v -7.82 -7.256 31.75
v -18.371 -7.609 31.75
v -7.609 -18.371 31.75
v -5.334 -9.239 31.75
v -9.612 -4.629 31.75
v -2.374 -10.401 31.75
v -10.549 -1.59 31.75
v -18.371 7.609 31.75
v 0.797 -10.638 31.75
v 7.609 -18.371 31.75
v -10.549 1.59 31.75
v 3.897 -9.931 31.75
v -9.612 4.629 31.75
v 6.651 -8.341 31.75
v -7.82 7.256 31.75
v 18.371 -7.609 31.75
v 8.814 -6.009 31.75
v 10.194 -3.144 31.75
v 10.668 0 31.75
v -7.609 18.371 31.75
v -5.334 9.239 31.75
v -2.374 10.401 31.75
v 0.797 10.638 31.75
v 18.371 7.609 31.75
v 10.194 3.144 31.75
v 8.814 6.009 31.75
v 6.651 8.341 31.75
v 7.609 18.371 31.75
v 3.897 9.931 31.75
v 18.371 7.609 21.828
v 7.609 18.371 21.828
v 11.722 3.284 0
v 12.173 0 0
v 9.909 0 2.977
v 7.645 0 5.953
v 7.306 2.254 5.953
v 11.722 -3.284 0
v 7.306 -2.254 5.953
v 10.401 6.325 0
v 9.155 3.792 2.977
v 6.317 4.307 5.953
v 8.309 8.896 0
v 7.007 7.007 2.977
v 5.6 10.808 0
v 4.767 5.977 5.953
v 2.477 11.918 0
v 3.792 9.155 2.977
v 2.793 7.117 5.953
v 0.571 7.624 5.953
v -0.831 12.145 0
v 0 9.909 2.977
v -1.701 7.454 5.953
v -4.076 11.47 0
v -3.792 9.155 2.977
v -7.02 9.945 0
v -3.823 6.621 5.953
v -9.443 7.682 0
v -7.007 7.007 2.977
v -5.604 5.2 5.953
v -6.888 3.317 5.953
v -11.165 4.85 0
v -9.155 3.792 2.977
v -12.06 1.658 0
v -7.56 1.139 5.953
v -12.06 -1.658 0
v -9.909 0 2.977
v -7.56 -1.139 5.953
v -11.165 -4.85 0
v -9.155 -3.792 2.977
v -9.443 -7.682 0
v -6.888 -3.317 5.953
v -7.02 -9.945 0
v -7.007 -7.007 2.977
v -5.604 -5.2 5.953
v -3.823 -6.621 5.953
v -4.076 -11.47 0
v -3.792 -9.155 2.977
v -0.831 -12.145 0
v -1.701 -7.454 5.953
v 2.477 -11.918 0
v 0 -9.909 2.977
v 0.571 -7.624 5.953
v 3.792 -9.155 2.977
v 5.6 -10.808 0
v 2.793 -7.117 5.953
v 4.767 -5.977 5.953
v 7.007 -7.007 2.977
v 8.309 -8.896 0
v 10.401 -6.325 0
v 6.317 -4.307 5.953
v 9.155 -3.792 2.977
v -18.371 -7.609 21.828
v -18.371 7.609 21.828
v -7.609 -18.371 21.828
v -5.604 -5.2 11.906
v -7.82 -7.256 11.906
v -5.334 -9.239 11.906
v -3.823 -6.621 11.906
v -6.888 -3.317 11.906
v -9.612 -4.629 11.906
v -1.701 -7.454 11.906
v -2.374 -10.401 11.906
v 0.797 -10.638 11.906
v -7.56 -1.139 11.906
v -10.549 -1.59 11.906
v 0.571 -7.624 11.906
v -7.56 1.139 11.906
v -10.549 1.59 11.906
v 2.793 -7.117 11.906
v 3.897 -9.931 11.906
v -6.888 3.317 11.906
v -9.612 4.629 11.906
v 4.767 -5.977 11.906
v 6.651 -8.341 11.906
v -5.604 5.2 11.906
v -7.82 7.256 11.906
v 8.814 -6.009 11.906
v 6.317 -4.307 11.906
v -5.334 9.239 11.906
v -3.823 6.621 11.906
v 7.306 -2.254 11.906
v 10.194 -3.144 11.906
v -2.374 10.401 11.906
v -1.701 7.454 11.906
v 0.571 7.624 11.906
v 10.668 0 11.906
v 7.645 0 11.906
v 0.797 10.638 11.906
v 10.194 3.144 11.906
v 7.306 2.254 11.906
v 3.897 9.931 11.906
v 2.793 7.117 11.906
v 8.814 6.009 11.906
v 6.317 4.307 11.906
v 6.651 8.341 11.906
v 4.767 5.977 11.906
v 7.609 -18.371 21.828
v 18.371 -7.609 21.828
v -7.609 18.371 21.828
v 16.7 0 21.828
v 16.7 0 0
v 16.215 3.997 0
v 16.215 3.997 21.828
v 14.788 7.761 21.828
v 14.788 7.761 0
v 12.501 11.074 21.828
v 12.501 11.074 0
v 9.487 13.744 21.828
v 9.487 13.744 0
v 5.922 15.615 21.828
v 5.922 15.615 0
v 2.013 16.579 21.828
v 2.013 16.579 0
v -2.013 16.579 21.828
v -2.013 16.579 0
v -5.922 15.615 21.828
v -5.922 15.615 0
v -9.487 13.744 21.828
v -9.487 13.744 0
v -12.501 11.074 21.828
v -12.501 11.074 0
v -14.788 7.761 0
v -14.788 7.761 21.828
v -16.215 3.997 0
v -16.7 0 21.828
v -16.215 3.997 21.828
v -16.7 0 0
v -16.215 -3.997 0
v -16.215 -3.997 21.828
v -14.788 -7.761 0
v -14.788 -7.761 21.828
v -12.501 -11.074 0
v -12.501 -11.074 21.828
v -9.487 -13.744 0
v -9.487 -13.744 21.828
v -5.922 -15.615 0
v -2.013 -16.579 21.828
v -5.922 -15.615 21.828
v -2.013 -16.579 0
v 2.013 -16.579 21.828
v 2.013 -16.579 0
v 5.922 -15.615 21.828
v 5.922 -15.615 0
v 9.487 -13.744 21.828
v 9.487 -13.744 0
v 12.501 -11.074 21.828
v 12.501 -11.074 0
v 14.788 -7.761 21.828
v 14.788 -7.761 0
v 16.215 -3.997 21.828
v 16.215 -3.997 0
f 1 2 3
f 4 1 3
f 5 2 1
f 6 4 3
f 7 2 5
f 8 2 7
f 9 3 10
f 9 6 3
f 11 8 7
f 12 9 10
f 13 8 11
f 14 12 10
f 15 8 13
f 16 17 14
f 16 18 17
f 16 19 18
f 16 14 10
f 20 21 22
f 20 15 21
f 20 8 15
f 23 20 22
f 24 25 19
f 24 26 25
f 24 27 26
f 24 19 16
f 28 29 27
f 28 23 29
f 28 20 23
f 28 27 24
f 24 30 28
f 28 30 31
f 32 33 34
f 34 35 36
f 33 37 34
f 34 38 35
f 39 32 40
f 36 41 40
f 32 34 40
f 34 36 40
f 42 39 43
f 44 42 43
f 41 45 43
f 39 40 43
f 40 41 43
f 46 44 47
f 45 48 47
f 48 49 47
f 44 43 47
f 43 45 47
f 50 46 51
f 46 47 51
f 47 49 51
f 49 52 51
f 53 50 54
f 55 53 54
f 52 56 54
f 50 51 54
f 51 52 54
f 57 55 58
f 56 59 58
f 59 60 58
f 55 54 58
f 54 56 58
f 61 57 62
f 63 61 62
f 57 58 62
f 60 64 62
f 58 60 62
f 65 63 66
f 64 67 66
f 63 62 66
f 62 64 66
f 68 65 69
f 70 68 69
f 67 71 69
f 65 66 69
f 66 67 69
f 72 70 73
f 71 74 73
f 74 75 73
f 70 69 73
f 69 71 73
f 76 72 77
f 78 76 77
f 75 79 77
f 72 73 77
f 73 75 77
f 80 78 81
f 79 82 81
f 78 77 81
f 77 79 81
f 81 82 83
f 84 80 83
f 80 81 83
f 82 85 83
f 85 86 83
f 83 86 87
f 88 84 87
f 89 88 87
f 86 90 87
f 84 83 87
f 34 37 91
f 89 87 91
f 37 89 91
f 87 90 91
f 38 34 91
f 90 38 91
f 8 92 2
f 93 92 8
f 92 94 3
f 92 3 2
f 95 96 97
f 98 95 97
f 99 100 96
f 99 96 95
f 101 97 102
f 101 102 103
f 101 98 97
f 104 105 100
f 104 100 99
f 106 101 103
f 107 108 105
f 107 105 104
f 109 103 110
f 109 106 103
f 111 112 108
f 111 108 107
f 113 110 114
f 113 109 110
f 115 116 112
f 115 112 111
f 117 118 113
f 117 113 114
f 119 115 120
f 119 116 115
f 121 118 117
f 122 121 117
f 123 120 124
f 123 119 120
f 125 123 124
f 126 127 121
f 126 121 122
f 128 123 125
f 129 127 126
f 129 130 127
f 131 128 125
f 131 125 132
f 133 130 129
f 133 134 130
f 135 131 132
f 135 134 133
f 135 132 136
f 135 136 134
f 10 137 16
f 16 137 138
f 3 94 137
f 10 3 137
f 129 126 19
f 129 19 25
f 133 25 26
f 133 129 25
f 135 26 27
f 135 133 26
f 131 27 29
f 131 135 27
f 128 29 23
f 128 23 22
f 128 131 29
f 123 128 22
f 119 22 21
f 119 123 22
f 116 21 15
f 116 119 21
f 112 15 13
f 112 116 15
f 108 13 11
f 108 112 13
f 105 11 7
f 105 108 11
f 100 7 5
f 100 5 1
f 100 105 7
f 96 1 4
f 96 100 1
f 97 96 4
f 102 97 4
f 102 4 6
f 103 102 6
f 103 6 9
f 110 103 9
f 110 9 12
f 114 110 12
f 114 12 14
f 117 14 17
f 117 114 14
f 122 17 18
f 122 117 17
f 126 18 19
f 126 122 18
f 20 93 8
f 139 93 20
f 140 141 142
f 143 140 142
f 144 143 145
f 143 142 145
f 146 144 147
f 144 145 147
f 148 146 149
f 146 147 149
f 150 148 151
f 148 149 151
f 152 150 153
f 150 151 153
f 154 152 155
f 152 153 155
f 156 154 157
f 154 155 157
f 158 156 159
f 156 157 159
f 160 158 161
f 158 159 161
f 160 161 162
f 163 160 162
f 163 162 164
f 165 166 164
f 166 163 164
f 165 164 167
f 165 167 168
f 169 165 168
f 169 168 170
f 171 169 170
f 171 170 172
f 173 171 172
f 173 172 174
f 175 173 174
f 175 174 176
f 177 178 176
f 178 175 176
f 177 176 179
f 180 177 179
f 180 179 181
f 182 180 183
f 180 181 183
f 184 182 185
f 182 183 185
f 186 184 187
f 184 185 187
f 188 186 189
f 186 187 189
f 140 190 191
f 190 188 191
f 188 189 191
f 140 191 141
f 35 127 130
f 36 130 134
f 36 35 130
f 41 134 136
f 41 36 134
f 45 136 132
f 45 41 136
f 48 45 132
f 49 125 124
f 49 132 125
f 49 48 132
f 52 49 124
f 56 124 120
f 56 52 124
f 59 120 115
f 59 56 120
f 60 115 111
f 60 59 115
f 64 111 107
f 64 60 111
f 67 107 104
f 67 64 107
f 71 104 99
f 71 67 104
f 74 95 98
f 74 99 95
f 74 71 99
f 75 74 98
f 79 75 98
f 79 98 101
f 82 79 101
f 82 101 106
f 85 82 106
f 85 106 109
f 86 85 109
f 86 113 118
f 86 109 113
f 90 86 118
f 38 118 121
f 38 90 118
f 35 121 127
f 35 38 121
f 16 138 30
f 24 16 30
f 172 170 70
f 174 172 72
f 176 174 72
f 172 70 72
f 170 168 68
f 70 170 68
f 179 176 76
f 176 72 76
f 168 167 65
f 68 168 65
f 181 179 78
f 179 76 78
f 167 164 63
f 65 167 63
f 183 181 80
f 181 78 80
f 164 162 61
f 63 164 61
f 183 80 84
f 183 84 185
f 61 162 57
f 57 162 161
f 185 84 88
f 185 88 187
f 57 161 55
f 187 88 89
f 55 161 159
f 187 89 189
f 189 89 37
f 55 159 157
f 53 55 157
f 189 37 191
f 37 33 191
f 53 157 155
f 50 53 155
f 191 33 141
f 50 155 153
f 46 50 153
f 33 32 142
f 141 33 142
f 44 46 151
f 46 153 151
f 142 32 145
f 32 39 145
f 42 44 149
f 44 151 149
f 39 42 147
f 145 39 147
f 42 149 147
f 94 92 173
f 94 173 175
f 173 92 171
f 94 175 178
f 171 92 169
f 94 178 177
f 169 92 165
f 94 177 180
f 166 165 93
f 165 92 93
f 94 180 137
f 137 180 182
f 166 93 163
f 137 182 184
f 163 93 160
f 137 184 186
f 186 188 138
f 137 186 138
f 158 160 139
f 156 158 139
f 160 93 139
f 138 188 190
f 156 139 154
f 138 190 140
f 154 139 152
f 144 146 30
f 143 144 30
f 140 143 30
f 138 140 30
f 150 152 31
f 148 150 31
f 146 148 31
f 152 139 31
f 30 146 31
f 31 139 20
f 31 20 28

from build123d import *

# Parameters (mm, degrees)
OUTERCYNLIDER002_R     = 10.668
OUTERCYNLIDER002_DEPTH = 19.84375
OUTERCYNLIDER001_R     = 7.6454
OUTERCYNLIDER001_DEPTH = 31.75
BOX001_W               = 36.7411
BOX001_H               = 36.7411
BOX001_DEPTH           = 9.921875
BOX001_PLACEMENT_ANGLE = 45
BOX_W                  = 36.7411
BOX_H                  = 36.7411
BOX_DEPTH              = 9.921875
OUTERCYNLIDER_R        = 16.7005
OUTERCYNLIDER_DEPTH    = 31.75


with BuildPart() as outercynlider002:
    # OuterCynlider002 → OuterCynlider002 (new body)
    with BuildSketch(Plane.XY.offset(11.90625)):
        Circle(OUTERCYNLIDER002_R)
    extrude(amount=OUTERCYNLIDER002_DEPTH)


with BuildPart() as cone:
    # Cone → Cone (revolve)
    with BuildSketch(Plane.XZ):
        Polygon((0, 0), (12.17295, 0), (7.6454, 5.953125), (0, 5.953125), align=None)
    revolve(axis=Axis((0, 0, 0), (0, 0, 1)))


with BuildPart() as fusion001:
    # OuterCynlider001 → OuterCynlider001 (new body)
    with BuildSketch(Plane.XY):
        Circle(OUTERCYNLIDER001_R)
    extrude(amount=OUTERCYNLIDER001_DEPTH)

    # Fusion001: union OuterCynlider002, Cone
    add(outercynlider002.part)
    add(cone.part)


with BuildPart() as box001:
    # Box001 → Box001 (new body)
    with BuildSketch(Plane.XY):
        with Locations((18.37055, 18.37055)):
            Rectangle(BOX001_W, BOX001_H)
    extrude(amount=BOX001_DEPTH)


with BuildPart() as box001_1:
    # Box001 placement: moved
    add(box001.part.moved(Location((0, -25.979881, 0))).rotate(Axis((0, -25.979881, 0), (0, 0, 1)), BOX001_PLACEMENT_ANGLE))


with BuildPart() as common:
    # Box → Box (new body)
    with BuildSketch(Plane(origin=(-18.37055, -18.37055, 0), x_dir=(1, 0, 0), z_dir=(0, 0, 1))):
        with Locations((18.37055, 18.37055)):
            Rectangle(BOX_W, BOX_H)
    extrude(amount=BOX_DEPTH)

    # Common: intersect Box001
    add(box001_1.part, mode=Mode.INTERSECT)


with BuildPart() as common_1:
    # Common placement: moved
    add(common.part.moved(Location((0, 0, 21.828125))))


with BuildPart() as cut:
    # OuterCynlider → OuterCynlider (new body)
    with BuildSketch(Plane.XY):
        Circle(OUTERCYNLIDER_R)
    extrude(amount=OUTERCYNLIDER_DEPTH)

    # Fusion: union Common
    add(common_1.part)

    # Cut: cut Fusion001
    add(fusion001.part, mode=Mode.SUBTRACT)


solid = cut.part
